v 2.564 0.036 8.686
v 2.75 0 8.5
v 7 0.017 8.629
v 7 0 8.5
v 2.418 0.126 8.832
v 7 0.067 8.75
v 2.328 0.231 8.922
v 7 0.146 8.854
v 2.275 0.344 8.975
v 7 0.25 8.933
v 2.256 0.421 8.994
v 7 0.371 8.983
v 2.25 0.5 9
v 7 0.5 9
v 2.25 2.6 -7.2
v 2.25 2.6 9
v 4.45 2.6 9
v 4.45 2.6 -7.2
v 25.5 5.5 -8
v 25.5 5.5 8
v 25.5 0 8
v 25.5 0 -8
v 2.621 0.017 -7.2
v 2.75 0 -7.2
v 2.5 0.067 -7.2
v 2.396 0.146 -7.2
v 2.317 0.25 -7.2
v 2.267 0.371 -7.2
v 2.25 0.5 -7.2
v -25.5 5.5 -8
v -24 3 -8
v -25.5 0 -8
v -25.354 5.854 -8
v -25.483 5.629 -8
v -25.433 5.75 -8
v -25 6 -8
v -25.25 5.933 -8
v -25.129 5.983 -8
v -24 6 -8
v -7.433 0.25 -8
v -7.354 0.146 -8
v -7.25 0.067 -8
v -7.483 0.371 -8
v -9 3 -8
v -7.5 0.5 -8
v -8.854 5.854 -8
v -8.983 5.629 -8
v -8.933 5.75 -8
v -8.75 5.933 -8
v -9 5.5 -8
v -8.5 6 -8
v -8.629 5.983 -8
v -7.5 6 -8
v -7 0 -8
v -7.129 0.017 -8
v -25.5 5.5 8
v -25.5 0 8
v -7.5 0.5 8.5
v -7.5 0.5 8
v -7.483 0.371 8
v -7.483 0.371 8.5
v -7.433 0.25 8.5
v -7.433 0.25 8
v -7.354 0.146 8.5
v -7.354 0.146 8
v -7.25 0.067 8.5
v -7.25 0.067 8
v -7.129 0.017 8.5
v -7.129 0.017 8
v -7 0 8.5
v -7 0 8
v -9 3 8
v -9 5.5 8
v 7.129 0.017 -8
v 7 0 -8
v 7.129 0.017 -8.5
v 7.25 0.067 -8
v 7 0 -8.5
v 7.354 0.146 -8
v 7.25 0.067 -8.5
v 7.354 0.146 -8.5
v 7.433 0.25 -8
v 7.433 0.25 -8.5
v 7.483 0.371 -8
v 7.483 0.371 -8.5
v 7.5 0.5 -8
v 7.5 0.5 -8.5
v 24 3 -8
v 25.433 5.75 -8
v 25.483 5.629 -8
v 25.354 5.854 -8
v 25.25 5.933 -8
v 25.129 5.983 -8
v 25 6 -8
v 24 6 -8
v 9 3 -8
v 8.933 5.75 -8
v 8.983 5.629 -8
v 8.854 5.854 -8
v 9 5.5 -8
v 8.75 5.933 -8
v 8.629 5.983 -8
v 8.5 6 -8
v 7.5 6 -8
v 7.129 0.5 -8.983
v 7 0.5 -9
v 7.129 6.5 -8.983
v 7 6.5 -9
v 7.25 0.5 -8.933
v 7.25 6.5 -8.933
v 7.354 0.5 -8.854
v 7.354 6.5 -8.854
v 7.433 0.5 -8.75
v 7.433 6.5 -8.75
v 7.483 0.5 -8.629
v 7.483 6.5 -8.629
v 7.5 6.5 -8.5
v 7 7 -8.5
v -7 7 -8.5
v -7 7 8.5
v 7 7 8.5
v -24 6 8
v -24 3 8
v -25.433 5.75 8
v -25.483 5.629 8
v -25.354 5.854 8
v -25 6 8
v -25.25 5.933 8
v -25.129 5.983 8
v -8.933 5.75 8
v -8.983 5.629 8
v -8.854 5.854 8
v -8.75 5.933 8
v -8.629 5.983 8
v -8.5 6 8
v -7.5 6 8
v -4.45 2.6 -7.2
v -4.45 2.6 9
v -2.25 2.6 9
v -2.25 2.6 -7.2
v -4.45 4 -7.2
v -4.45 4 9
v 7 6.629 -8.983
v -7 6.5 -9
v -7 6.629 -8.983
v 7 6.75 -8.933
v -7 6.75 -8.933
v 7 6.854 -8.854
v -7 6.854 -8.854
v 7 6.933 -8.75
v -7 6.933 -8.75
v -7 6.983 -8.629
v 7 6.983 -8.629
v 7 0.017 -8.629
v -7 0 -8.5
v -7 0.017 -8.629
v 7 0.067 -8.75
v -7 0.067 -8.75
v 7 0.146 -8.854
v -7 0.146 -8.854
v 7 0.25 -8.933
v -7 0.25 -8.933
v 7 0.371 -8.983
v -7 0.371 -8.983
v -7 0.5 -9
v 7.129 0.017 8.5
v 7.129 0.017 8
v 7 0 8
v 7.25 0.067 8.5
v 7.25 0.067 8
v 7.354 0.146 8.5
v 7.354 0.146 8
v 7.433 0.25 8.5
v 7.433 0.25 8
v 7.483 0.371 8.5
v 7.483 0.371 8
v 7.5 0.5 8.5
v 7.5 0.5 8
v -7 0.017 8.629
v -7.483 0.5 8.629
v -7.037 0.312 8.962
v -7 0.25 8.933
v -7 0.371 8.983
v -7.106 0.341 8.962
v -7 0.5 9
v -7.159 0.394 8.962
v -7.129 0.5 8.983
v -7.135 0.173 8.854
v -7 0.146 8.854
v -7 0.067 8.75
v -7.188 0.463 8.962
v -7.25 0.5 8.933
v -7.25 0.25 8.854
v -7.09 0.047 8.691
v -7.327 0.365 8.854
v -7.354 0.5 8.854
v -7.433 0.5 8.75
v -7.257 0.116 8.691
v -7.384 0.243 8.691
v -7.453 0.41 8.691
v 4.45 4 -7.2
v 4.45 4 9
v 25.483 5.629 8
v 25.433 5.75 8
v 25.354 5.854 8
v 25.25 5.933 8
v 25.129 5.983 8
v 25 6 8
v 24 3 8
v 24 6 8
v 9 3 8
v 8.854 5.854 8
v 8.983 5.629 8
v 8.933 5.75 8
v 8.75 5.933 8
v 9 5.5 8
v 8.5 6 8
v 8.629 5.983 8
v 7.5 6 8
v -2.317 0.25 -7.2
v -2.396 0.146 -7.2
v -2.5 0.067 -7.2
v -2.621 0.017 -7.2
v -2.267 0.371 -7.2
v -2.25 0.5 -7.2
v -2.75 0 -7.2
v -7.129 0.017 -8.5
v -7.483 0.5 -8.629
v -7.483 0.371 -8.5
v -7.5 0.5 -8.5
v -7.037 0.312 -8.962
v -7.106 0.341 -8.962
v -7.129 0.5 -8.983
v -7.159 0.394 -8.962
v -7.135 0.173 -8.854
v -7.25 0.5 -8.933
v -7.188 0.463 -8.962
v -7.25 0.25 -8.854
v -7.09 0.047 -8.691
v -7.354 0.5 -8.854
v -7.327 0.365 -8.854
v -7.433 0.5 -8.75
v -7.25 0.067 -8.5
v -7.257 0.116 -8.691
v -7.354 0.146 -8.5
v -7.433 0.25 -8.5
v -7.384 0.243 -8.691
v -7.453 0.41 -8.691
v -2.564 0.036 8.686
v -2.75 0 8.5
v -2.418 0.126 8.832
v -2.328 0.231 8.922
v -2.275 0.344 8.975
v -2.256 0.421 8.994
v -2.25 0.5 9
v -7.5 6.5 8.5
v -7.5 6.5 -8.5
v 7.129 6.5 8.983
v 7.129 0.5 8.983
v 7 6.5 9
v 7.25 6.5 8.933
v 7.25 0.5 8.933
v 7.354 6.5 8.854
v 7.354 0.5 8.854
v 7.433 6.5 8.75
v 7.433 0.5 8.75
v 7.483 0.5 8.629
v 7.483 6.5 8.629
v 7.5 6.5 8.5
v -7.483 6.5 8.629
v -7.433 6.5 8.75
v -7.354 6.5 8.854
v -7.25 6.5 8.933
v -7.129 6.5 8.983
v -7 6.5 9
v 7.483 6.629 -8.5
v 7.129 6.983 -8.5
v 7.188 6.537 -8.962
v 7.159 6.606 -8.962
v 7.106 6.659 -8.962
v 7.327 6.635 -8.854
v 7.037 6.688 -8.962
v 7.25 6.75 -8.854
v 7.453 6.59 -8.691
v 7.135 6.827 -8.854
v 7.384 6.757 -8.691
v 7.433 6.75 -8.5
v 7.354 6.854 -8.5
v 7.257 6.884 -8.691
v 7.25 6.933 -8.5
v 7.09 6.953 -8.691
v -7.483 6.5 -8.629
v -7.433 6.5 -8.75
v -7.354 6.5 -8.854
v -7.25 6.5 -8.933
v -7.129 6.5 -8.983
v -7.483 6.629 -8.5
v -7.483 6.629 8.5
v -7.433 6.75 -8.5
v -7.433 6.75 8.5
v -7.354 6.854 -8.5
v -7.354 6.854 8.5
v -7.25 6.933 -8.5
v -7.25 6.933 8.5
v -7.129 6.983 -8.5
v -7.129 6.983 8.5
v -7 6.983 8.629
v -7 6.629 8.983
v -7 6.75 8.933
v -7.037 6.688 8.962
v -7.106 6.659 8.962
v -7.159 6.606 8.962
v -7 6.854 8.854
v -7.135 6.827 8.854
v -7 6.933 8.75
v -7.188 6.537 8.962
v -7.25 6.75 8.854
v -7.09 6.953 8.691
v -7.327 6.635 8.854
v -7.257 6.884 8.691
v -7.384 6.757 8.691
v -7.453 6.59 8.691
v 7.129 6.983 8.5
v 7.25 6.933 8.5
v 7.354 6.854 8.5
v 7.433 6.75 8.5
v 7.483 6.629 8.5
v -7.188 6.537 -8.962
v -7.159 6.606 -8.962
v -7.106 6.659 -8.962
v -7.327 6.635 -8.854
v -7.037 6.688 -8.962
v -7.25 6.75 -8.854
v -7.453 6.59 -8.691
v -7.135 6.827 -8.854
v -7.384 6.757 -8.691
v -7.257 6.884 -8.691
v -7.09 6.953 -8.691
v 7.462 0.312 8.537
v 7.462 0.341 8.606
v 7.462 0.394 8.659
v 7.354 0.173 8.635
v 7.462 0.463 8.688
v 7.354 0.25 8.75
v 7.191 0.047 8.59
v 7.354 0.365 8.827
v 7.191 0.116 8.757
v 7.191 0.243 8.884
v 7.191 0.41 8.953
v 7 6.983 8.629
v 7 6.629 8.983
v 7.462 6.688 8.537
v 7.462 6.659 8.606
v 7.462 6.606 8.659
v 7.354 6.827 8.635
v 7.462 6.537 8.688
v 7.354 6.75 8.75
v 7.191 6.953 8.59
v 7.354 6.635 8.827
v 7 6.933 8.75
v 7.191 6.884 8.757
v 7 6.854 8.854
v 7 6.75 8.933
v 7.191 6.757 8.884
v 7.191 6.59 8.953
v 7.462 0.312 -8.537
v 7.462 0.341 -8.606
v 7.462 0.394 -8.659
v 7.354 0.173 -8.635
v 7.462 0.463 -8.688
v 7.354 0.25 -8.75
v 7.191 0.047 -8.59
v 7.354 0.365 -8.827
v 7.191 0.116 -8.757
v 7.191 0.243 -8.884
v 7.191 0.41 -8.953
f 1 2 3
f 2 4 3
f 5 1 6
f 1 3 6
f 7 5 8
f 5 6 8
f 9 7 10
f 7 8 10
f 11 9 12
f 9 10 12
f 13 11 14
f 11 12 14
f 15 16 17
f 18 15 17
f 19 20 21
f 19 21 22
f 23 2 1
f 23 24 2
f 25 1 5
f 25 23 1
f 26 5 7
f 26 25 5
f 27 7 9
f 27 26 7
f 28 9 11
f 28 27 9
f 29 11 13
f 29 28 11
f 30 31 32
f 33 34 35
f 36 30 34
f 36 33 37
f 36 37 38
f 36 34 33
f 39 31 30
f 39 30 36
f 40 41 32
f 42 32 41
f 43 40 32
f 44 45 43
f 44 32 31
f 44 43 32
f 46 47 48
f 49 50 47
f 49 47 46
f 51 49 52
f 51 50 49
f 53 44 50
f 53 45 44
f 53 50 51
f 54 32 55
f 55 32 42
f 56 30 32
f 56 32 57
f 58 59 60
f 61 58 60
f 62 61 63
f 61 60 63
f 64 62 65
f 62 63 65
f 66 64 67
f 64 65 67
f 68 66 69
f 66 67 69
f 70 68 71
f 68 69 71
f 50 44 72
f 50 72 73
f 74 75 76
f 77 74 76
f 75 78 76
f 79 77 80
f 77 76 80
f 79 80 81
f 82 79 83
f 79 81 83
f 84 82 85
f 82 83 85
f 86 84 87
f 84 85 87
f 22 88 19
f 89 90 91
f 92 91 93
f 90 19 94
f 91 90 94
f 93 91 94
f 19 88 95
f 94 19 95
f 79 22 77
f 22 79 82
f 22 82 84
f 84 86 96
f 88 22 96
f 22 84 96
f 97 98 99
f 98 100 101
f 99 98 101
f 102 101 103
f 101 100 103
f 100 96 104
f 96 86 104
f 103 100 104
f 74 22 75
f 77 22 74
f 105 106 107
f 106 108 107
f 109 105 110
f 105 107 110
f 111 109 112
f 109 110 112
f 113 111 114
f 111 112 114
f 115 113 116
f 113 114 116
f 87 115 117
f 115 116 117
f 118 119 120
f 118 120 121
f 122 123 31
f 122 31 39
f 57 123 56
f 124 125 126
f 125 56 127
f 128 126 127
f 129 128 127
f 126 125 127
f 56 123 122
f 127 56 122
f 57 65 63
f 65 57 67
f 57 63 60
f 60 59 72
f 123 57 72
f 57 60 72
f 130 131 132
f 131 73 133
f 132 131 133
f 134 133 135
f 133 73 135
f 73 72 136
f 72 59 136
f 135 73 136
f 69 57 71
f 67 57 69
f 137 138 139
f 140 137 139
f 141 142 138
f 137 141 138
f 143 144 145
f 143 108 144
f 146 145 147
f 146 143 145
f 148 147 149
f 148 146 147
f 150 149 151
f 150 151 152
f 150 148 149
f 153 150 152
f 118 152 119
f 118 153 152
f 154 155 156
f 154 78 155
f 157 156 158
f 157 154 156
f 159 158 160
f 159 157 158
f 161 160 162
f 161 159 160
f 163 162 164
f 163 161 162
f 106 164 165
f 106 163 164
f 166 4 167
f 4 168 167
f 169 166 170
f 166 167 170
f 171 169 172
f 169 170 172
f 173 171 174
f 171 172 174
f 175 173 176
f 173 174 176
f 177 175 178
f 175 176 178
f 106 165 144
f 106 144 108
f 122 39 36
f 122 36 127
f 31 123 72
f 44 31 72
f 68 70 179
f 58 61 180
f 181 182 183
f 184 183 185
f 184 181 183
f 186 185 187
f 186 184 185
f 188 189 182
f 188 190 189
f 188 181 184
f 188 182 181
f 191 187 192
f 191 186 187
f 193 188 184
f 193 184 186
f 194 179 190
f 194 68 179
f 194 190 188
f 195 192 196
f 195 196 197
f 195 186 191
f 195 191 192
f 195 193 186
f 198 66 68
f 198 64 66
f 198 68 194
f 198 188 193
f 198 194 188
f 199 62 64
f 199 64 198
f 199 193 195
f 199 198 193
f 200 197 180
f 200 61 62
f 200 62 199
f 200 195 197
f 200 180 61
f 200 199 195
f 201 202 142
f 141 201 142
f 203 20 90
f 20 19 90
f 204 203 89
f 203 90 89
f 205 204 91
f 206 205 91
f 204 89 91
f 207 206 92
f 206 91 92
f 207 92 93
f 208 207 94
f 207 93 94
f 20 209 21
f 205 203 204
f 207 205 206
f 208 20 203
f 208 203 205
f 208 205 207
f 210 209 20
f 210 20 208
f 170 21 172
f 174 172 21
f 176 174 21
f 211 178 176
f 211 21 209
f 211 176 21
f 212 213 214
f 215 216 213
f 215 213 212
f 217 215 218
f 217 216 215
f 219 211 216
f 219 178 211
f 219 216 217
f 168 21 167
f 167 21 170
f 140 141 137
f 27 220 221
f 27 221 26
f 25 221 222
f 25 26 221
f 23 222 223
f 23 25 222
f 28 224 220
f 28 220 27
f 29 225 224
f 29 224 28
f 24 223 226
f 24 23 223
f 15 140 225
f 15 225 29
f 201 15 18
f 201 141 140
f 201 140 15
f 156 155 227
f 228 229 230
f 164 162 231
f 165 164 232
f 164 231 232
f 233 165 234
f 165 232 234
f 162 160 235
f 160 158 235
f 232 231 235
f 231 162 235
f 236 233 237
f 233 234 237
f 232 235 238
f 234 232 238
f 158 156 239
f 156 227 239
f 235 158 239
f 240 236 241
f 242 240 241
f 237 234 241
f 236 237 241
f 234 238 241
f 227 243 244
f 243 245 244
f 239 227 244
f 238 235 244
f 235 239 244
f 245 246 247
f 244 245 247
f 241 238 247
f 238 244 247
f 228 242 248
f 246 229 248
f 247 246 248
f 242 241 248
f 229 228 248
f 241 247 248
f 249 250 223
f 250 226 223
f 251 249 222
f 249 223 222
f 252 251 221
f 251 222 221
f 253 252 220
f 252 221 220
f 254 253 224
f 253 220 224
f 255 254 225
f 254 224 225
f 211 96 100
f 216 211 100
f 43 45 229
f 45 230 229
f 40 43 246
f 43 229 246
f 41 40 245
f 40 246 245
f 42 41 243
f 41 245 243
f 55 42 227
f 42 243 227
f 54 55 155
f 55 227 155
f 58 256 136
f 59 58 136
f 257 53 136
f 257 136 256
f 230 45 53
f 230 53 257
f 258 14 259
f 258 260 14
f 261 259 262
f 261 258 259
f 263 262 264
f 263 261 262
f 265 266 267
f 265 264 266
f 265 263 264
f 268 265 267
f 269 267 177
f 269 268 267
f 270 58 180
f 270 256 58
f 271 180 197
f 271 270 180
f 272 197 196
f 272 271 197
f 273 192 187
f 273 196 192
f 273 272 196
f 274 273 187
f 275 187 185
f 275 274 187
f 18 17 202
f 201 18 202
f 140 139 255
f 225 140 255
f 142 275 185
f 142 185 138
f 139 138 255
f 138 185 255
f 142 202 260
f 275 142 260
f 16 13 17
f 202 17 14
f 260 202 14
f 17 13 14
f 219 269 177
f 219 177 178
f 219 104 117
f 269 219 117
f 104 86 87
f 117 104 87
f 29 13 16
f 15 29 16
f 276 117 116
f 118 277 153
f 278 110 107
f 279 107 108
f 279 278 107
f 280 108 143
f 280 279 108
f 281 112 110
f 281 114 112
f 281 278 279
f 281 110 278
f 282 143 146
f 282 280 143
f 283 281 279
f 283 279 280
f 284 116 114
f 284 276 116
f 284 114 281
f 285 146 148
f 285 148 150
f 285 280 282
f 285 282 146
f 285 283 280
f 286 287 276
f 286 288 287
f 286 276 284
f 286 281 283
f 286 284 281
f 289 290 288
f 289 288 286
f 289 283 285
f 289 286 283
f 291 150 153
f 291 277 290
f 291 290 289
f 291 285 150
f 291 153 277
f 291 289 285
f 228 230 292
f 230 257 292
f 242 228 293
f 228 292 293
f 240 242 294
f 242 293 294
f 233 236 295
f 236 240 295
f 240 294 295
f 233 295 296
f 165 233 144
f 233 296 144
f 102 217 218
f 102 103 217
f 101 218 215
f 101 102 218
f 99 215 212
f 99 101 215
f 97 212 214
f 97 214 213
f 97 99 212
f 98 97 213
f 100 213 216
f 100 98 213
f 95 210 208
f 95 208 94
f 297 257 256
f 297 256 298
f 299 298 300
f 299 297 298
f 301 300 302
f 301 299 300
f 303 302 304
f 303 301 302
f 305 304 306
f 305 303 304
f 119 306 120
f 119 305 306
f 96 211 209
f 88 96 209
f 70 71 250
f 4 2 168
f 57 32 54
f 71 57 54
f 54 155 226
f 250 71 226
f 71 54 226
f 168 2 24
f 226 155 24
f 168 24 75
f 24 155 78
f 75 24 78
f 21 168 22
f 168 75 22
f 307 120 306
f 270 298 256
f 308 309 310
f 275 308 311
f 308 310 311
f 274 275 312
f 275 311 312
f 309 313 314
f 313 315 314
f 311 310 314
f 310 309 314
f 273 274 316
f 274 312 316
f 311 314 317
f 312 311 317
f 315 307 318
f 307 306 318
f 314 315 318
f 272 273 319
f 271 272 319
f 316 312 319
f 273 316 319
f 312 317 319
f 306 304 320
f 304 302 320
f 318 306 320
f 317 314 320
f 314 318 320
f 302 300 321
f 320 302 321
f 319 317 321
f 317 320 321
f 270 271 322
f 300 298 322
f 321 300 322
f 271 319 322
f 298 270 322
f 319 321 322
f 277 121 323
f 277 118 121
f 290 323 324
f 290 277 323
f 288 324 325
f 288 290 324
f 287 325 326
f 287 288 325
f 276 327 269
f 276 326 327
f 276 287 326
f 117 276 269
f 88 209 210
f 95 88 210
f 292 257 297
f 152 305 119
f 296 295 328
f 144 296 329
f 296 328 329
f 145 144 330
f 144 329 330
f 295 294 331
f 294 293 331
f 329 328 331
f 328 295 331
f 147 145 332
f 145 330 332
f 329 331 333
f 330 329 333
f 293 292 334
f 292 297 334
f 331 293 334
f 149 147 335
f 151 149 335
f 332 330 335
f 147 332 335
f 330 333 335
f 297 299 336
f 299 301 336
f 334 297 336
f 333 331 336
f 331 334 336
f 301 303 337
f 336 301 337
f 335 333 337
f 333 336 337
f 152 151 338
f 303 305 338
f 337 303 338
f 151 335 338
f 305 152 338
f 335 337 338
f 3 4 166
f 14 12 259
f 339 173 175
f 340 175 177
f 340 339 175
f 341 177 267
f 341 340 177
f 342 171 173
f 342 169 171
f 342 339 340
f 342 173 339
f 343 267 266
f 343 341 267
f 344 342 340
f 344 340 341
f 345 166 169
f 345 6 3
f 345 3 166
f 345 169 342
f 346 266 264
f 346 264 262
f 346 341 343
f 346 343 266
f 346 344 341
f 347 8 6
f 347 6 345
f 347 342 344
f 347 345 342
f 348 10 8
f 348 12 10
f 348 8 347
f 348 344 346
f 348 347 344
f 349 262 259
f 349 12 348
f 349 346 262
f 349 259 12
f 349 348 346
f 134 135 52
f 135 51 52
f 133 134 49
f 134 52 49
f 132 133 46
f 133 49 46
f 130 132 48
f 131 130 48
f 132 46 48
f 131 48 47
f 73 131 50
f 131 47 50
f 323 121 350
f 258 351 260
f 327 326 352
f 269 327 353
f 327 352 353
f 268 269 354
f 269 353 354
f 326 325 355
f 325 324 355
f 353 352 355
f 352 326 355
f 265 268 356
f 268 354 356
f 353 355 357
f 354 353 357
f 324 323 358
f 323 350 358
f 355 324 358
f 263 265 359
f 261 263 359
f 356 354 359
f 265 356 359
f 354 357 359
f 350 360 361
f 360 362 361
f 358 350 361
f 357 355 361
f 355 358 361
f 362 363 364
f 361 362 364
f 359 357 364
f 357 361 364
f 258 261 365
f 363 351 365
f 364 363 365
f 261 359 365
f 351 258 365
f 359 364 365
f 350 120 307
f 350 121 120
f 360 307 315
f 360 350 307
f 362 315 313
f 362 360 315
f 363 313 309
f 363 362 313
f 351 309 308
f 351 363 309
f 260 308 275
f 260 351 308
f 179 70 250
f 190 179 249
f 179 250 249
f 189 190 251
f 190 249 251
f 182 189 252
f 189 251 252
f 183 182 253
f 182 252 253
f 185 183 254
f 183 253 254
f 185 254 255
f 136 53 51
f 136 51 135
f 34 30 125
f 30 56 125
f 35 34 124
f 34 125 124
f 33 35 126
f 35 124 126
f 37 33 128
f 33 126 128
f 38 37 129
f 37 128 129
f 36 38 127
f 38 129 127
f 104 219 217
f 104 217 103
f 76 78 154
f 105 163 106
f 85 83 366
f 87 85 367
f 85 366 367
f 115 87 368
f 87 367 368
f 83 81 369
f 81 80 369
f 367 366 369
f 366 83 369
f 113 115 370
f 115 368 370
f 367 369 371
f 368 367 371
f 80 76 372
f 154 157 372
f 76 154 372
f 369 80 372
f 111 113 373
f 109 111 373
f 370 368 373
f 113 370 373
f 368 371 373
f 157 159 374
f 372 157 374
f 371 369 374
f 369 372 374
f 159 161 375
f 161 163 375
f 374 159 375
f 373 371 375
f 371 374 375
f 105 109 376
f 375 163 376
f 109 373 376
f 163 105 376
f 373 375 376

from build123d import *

# Parameters (mm, degrees)
SKETCH1_W           = 15
SKETCH1_H           = 18
BOSS_EXTRUDE1_DEPTH = 7
CUT_EXTRUDE1_DEPTH  = 16.2
SKETCH9_W           = 16
SKETCH9_H           = 6
BOSS_EXTRUDE2_DEPTH = 18
SKETCH13_W          = 16
SKETCH13_H          = 6
BOSS_EXTRUDE3_DEPTH = 18
SKETCH14_W          = 15
SKETCH14_H          = 3
CUT_EXTRUDE5_DEPTH  = 32.55
FILLET1_R           = 0.5


with BuildPart() as part:
    # Sketch1 → Boss-Extrude1 (new body)
    with BuildSketch(Plane(origin=(0, 0, 0), x_dir=(1, 0, 0), z_dir=(0, 1, 0))):
        Rectangle(SKETCH1_W, SKETCH1_H)
    extrude(amount=BOSS_EXTRUDE1_DEPTH)

    # Sketch2 → Cut-Extrude1 (cut)
    with BuildSketch(Plane.XY.offset(9)):
        Polygon((-2.25, 2.6), (-2.25, 0), (2.25, 0), (2.25, 2.6), (4.45, 2.6), (4.45, 4), (-4.45, 4), (-4.45, 2.6), align=None)
    extrude(amount=-CUT_EXTRUDE1_DEPTH, mode=Mode.SUBTRACT)

    # Sketch9 → Boss-Extrude2 (add)
    with BuildSketch(Plane.ZY.offset(7.5)):
        with Locations((0, 3)):
            Rectangle(SKETCH9_W, SKETCH9_H)
    extrude(amount=BOSS_EXTRUDE2_DEPTH)

    # Sketch13 → Boss-Extrude3 (add)
    with BuildSketch(Plane(origin=(7.5, 0, 0), x_dir=(0, 0, -1), z_dir=(1, 0, 0))):
        with Locations((0, 3)):
            Rectangle(SKETCH13_W, SKETCH13_H)
    extrude(amount=BOSS_EXTRUDE3_DEPTH)

    # Sketch14 → Cut-Extrude5 (cut)
    with BuildSketch(Plane.XY.offset(9)):
        with Locations((16.5, 4.5)):
            Rectangle(SKETCH14_W, SKETCH14_H)
        with Locations((-16.5, 4.5)):
            Rectangle(SKETCH14_W, SKETCH14_H)
    extrude(amount=-CUT_EXTRUDE5_DEPTH, mode=Mode.SUBTRACT)

    # Fillet1
    fillet1_edges = [part.edges().sort_by_distance(p)[0] for p in [
        (-7.5, 7, 0),
        (4.875, 0, 9),
        (0, 7, 9),
        (-2.25, 0, 0.9),
        (2.25, 0, 0.9),
        (-7.5, 0, 8.5),
        (-25.5, 6, 0),
        (7.5, 7, 0),
        (-4.875, 0, 9),
        (-7.5, 0, -8.5),
        (0, 0, -9),
        (7.5, 0, -8.5),
        (7.5, 0, 8.5),
        (25.5, 6, 0),
        (7.5, 3.5, 9),
        (-7.5, 3.5, 9),
        (-7.5, 3.5, -9),
        (7.5, 3.5, -9),
        (9, 6, 0),
        (0, 7, -9),
        (-9, 6, 0),
    ]]
    fillet(fillet1_edges, radius=FILLET1_R)


solid = part.part
